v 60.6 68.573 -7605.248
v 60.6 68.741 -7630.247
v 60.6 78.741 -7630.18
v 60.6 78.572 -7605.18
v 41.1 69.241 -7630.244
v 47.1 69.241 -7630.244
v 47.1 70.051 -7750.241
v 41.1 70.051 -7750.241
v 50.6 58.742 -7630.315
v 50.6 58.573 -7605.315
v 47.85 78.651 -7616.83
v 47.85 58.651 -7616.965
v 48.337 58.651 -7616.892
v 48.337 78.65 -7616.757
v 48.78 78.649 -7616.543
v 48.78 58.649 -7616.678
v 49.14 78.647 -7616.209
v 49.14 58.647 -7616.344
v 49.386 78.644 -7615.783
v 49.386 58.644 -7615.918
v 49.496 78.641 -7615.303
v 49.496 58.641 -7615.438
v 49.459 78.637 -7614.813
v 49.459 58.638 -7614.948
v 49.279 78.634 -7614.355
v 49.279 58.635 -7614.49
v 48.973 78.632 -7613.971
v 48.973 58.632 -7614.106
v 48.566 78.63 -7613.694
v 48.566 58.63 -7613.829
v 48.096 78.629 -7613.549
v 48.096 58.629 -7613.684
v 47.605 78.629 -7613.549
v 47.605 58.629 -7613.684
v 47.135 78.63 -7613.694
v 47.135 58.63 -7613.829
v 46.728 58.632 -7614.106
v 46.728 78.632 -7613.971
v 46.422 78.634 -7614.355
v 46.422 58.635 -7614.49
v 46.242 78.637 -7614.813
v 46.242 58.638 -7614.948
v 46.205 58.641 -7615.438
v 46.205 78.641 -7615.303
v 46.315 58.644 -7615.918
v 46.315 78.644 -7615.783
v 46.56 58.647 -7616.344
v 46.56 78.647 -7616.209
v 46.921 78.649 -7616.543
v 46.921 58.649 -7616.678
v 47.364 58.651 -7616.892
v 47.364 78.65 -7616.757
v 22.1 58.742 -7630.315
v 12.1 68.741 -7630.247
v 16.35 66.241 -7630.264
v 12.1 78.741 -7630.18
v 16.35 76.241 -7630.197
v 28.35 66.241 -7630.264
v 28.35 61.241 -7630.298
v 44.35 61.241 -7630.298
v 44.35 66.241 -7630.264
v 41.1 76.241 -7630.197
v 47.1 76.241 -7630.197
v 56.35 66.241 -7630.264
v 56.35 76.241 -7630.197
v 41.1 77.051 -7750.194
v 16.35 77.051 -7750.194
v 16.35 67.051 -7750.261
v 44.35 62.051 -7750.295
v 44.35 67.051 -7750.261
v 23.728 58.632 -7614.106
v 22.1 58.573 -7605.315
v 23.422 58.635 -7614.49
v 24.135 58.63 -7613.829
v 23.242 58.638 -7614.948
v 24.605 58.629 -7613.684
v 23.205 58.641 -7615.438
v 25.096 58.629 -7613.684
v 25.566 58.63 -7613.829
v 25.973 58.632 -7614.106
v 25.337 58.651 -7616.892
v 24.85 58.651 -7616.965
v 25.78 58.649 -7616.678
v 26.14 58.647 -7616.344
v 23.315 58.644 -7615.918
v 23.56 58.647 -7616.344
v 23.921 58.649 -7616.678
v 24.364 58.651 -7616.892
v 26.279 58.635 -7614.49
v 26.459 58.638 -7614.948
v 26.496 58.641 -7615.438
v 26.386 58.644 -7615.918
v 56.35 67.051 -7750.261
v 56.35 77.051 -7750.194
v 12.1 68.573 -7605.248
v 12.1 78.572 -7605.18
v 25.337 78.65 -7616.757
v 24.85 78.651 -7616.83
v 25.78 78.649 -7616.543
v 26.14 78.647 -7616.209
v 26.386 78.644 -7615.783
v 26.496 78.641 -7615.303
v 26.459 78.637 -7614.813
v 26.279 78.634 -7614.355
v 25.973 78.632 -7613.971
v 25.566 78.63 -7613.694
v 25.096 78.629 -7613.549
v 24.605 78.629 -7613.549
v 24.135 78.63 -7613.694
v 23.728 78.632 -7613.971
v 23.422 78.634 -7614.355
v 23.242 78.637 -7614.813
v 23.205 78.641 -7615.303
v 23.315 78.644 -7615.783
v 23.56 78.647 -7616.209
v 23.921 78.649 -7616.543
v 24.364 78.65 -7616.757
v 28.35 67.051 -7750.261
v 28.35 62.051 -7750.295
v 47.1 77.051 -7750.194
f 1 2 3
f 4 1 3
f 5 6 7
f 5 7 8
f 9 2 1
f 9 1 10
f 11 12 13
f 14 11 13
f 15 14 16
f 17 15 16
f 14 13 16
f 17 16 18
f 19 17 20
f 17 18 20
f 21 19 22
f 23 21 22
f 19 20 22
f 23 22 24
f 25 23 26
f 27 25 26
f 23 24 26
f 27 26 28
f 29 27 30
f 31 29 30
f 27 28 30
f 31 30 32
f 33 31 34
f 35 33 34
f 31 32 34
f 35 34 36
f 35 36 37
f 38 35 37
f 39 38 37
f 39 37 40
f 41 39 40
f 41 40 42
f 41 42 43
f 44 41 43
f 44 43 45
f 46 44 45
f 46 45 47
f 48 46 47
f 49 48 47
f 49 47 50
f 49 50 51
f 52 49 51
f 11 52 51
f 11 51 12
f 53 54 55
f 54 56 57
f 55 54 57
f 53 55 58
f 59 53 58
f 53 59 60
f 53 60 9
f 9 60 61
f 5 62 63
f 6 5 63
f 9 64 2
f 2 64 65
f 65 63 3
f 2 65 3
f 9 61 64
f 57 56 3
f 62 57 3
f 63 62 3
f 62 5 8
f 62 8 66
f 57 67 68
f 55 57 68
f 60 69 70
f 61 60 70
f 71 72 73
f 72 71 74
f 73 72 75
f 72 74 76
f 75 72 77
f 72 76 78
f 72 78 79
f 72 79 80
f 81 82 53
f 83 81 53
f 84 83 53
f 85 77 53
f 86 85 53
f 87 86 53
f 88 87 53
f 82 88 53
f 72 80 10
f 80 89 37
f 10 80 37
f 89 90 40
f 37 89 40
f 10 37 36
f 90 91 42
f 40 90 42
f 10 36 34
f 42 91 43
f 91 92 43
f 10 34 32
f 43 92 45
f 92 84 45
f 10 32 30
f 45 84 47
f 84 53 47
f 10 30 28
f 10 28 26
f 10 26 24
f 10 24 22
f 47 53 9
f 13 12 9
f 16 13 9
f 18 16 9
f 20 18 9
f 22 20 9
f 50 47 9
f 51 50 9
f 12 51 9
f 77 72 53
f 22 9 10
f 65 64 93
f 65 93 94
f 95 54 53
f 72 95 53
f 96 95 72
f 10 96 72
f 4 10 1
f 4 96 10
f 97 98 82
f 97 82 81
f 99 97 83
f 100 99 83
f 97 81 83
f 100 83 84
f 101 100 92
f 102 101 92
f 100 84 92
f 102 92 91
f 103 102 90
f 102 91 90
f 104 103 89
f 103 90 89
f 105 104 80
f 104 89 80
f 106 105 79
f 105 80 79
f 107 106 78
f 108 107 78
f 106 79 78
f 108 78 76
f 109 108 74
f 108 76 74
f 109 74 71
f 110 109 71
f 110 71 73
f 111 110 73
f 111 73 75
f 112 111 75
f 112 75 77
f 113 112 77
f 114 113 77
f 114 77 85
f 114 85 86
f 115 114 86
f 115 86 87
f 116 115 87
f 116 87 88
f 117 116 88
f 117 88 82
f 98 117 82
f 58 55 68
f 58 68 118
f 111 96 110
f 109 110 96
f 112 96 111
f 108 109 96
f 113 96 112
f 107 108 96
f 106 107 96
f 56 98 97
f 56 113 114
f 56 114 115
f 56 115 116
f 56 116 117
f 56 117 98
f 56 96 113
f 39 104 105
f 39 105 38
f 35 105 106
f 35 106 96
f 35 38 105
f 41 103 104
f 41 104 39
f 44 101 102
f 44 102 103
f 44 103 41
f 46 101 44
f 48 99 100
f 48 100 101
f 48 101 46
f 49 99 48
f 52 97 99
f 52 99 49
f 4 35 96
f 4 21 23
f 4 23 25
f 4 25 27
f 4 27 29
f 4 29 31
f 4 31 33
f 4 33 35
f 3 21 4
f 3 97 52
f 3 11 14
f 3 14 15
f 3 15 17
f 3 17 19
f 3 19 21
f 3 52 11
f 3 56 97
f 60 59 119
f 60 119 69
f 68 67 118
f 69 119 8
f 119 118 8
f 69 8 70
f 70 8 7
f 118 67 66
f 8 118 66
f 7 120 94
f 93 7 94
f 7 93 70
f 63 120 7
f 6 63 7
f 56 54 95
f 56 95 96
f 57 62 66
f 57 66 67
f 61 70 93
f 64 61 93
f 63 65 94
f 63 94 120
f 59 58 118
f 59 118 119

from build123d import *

# Parameters (mm, degrees)
EXTRUDE_1_DEPTH              = 120
SKETCH_2_W                   = 48.5
SKETCH_2_H                   = 20
EXTRUDE_2_DEPTH              = 25
HOLE_WIZARD_M4_1_D           = 3.3
HOLE_WIZARD_M4_1_ON_FACE_2_D = 3.3
CUT_EXTRUDE_1_REACH          = 161.463


with BuildPart() as part:
    # 草图1 → 凸台-拉伸1 (new body)
    with BuildSketch(Plane(origin=(0, 51.506568262, -7630.363691544), x_dir=(1, 0, 0), z_dir=(0, -0.006750057654754126, 0.9999772181013213))):
        Polygon((28.350451638, 9.735119508), (36.350451638, 9.735119508), (36.350451638, 24.735119508), (16.350451638, 24.735119508), (16.350451638, 14.735119508), (28.350451638, 14.735119508), align=None)
        Polygon((36.350451638, 24.735119508), (36.350451638, 9.735119508), (44.350451638, 9.735119508), (44.350451638, 14.735119508), (56.350451638, 14.735119508), (56.350451638, 24.735119508), (47.100400838, 24.735119508), (47.100400838, 22.735119508), (47.100400838, 17.735119508), (41.100400838, 17.735119508), (41.100400838, 22.735119508), (41.100400838, 24.735119508), align=None)
    extrude(amount=-EXTRUDE_1_DEPTH)

    # 草图2 → 凸台-拉伸2 (add)
    with BuildSketch(Plane(origin=(0, 51.506568262, -7630.363691544), x_dir=(1, 0, 0), z_dir=(0, -0.00675005765475416, 0.9999772181013213))):
        with Locations((36.350451638, 17.235119507)):
            Rectangle(SKETCH_2_W, SKETCH_2_H)
    extrude(amount=EXTRUDE_2_DEPTH)

    # M4 螺纹孔1 (through all)
    with Locations(Plane(origin=(47.850451638, 78.639816437, -7615.180194646), x_dir=(0, -0.006750057655, 0.999977218101), z_dir=(0, 0.999977218101, 0.006750057655))):
        with Locations((0, 0)):
            Hole(HOLE_WIZARD_M4_1_D / 2)

    # M4 螺纹孔1 on face 2 (through all)
    with Locations(Plane(origin=(24.850451638, 78.639816437, -7615.180194646), x_dir=(0, -0.006750001475, 0.999977218481), z_dir=(0, 0.999977218481, 0.006750001475))):
        with Locations((0, 0)):
            Hole(HOLE_WIZARD_M4_1_ON_FACE_2_D / 2)

    # 草图5 → 切除-拉伸1 (cut, up to next)
    with BuildSketch(Plane(origin=(0, 51.337816821, -7605.364261092), x_dir=(1, 0, 0), z_dir=(0, -0.0067500576547363505, 0.9999772181013213)), mode=Mode.PRIVATE) as cut_extrude_1_sk1:
        Polygon((12.100451638, 17.235119508), (22.100451638, 7.235119508), (12.100451638, 7.235119508), align=None)
    cut_extrude_1_tool1 = extrude(cut_extrude_1_sk1.sketch, amount=-CUT_EXTRUDE_1_REACH, mode=Mode.PRIVATE) & part.part
    # 草图5 → 切除-拉伸1 (cut, up to next)
    with BuildSketch(Plane(origin=(0, 51.337816821, -7605.364261092), x_dir=(1, 0, 0), z_dir=(0, -0.0067500576547363505, 0.9999772181013213)), mode=Mode.PRIVATE) as cut_extrude_1_sk2:
        Polygon((60.600451638, 17.235119508), (50.600451638, 7.235119508), (60.600451638, 7.235119508), align=None)
    cut_extrude_1_tool2 = extrude(cut_extrude_1_sk2.sketch, amount=-CUT_EXTRUDE_1_REACH, mode=Mode.PRIVATE) & part.part
    add(cut_extrude_1_tool1.solids().sort_by_distance((15.433785, 61.906029, -7605.292923))[0], mode=Mode.SUBTRACT)
    add(cut_extrude_1_tool2.solids().sort_by_distance((57.267118, 61.906029, -7605.292923))[0], mode=Mode.SUBTRACT)


solid = part.part
